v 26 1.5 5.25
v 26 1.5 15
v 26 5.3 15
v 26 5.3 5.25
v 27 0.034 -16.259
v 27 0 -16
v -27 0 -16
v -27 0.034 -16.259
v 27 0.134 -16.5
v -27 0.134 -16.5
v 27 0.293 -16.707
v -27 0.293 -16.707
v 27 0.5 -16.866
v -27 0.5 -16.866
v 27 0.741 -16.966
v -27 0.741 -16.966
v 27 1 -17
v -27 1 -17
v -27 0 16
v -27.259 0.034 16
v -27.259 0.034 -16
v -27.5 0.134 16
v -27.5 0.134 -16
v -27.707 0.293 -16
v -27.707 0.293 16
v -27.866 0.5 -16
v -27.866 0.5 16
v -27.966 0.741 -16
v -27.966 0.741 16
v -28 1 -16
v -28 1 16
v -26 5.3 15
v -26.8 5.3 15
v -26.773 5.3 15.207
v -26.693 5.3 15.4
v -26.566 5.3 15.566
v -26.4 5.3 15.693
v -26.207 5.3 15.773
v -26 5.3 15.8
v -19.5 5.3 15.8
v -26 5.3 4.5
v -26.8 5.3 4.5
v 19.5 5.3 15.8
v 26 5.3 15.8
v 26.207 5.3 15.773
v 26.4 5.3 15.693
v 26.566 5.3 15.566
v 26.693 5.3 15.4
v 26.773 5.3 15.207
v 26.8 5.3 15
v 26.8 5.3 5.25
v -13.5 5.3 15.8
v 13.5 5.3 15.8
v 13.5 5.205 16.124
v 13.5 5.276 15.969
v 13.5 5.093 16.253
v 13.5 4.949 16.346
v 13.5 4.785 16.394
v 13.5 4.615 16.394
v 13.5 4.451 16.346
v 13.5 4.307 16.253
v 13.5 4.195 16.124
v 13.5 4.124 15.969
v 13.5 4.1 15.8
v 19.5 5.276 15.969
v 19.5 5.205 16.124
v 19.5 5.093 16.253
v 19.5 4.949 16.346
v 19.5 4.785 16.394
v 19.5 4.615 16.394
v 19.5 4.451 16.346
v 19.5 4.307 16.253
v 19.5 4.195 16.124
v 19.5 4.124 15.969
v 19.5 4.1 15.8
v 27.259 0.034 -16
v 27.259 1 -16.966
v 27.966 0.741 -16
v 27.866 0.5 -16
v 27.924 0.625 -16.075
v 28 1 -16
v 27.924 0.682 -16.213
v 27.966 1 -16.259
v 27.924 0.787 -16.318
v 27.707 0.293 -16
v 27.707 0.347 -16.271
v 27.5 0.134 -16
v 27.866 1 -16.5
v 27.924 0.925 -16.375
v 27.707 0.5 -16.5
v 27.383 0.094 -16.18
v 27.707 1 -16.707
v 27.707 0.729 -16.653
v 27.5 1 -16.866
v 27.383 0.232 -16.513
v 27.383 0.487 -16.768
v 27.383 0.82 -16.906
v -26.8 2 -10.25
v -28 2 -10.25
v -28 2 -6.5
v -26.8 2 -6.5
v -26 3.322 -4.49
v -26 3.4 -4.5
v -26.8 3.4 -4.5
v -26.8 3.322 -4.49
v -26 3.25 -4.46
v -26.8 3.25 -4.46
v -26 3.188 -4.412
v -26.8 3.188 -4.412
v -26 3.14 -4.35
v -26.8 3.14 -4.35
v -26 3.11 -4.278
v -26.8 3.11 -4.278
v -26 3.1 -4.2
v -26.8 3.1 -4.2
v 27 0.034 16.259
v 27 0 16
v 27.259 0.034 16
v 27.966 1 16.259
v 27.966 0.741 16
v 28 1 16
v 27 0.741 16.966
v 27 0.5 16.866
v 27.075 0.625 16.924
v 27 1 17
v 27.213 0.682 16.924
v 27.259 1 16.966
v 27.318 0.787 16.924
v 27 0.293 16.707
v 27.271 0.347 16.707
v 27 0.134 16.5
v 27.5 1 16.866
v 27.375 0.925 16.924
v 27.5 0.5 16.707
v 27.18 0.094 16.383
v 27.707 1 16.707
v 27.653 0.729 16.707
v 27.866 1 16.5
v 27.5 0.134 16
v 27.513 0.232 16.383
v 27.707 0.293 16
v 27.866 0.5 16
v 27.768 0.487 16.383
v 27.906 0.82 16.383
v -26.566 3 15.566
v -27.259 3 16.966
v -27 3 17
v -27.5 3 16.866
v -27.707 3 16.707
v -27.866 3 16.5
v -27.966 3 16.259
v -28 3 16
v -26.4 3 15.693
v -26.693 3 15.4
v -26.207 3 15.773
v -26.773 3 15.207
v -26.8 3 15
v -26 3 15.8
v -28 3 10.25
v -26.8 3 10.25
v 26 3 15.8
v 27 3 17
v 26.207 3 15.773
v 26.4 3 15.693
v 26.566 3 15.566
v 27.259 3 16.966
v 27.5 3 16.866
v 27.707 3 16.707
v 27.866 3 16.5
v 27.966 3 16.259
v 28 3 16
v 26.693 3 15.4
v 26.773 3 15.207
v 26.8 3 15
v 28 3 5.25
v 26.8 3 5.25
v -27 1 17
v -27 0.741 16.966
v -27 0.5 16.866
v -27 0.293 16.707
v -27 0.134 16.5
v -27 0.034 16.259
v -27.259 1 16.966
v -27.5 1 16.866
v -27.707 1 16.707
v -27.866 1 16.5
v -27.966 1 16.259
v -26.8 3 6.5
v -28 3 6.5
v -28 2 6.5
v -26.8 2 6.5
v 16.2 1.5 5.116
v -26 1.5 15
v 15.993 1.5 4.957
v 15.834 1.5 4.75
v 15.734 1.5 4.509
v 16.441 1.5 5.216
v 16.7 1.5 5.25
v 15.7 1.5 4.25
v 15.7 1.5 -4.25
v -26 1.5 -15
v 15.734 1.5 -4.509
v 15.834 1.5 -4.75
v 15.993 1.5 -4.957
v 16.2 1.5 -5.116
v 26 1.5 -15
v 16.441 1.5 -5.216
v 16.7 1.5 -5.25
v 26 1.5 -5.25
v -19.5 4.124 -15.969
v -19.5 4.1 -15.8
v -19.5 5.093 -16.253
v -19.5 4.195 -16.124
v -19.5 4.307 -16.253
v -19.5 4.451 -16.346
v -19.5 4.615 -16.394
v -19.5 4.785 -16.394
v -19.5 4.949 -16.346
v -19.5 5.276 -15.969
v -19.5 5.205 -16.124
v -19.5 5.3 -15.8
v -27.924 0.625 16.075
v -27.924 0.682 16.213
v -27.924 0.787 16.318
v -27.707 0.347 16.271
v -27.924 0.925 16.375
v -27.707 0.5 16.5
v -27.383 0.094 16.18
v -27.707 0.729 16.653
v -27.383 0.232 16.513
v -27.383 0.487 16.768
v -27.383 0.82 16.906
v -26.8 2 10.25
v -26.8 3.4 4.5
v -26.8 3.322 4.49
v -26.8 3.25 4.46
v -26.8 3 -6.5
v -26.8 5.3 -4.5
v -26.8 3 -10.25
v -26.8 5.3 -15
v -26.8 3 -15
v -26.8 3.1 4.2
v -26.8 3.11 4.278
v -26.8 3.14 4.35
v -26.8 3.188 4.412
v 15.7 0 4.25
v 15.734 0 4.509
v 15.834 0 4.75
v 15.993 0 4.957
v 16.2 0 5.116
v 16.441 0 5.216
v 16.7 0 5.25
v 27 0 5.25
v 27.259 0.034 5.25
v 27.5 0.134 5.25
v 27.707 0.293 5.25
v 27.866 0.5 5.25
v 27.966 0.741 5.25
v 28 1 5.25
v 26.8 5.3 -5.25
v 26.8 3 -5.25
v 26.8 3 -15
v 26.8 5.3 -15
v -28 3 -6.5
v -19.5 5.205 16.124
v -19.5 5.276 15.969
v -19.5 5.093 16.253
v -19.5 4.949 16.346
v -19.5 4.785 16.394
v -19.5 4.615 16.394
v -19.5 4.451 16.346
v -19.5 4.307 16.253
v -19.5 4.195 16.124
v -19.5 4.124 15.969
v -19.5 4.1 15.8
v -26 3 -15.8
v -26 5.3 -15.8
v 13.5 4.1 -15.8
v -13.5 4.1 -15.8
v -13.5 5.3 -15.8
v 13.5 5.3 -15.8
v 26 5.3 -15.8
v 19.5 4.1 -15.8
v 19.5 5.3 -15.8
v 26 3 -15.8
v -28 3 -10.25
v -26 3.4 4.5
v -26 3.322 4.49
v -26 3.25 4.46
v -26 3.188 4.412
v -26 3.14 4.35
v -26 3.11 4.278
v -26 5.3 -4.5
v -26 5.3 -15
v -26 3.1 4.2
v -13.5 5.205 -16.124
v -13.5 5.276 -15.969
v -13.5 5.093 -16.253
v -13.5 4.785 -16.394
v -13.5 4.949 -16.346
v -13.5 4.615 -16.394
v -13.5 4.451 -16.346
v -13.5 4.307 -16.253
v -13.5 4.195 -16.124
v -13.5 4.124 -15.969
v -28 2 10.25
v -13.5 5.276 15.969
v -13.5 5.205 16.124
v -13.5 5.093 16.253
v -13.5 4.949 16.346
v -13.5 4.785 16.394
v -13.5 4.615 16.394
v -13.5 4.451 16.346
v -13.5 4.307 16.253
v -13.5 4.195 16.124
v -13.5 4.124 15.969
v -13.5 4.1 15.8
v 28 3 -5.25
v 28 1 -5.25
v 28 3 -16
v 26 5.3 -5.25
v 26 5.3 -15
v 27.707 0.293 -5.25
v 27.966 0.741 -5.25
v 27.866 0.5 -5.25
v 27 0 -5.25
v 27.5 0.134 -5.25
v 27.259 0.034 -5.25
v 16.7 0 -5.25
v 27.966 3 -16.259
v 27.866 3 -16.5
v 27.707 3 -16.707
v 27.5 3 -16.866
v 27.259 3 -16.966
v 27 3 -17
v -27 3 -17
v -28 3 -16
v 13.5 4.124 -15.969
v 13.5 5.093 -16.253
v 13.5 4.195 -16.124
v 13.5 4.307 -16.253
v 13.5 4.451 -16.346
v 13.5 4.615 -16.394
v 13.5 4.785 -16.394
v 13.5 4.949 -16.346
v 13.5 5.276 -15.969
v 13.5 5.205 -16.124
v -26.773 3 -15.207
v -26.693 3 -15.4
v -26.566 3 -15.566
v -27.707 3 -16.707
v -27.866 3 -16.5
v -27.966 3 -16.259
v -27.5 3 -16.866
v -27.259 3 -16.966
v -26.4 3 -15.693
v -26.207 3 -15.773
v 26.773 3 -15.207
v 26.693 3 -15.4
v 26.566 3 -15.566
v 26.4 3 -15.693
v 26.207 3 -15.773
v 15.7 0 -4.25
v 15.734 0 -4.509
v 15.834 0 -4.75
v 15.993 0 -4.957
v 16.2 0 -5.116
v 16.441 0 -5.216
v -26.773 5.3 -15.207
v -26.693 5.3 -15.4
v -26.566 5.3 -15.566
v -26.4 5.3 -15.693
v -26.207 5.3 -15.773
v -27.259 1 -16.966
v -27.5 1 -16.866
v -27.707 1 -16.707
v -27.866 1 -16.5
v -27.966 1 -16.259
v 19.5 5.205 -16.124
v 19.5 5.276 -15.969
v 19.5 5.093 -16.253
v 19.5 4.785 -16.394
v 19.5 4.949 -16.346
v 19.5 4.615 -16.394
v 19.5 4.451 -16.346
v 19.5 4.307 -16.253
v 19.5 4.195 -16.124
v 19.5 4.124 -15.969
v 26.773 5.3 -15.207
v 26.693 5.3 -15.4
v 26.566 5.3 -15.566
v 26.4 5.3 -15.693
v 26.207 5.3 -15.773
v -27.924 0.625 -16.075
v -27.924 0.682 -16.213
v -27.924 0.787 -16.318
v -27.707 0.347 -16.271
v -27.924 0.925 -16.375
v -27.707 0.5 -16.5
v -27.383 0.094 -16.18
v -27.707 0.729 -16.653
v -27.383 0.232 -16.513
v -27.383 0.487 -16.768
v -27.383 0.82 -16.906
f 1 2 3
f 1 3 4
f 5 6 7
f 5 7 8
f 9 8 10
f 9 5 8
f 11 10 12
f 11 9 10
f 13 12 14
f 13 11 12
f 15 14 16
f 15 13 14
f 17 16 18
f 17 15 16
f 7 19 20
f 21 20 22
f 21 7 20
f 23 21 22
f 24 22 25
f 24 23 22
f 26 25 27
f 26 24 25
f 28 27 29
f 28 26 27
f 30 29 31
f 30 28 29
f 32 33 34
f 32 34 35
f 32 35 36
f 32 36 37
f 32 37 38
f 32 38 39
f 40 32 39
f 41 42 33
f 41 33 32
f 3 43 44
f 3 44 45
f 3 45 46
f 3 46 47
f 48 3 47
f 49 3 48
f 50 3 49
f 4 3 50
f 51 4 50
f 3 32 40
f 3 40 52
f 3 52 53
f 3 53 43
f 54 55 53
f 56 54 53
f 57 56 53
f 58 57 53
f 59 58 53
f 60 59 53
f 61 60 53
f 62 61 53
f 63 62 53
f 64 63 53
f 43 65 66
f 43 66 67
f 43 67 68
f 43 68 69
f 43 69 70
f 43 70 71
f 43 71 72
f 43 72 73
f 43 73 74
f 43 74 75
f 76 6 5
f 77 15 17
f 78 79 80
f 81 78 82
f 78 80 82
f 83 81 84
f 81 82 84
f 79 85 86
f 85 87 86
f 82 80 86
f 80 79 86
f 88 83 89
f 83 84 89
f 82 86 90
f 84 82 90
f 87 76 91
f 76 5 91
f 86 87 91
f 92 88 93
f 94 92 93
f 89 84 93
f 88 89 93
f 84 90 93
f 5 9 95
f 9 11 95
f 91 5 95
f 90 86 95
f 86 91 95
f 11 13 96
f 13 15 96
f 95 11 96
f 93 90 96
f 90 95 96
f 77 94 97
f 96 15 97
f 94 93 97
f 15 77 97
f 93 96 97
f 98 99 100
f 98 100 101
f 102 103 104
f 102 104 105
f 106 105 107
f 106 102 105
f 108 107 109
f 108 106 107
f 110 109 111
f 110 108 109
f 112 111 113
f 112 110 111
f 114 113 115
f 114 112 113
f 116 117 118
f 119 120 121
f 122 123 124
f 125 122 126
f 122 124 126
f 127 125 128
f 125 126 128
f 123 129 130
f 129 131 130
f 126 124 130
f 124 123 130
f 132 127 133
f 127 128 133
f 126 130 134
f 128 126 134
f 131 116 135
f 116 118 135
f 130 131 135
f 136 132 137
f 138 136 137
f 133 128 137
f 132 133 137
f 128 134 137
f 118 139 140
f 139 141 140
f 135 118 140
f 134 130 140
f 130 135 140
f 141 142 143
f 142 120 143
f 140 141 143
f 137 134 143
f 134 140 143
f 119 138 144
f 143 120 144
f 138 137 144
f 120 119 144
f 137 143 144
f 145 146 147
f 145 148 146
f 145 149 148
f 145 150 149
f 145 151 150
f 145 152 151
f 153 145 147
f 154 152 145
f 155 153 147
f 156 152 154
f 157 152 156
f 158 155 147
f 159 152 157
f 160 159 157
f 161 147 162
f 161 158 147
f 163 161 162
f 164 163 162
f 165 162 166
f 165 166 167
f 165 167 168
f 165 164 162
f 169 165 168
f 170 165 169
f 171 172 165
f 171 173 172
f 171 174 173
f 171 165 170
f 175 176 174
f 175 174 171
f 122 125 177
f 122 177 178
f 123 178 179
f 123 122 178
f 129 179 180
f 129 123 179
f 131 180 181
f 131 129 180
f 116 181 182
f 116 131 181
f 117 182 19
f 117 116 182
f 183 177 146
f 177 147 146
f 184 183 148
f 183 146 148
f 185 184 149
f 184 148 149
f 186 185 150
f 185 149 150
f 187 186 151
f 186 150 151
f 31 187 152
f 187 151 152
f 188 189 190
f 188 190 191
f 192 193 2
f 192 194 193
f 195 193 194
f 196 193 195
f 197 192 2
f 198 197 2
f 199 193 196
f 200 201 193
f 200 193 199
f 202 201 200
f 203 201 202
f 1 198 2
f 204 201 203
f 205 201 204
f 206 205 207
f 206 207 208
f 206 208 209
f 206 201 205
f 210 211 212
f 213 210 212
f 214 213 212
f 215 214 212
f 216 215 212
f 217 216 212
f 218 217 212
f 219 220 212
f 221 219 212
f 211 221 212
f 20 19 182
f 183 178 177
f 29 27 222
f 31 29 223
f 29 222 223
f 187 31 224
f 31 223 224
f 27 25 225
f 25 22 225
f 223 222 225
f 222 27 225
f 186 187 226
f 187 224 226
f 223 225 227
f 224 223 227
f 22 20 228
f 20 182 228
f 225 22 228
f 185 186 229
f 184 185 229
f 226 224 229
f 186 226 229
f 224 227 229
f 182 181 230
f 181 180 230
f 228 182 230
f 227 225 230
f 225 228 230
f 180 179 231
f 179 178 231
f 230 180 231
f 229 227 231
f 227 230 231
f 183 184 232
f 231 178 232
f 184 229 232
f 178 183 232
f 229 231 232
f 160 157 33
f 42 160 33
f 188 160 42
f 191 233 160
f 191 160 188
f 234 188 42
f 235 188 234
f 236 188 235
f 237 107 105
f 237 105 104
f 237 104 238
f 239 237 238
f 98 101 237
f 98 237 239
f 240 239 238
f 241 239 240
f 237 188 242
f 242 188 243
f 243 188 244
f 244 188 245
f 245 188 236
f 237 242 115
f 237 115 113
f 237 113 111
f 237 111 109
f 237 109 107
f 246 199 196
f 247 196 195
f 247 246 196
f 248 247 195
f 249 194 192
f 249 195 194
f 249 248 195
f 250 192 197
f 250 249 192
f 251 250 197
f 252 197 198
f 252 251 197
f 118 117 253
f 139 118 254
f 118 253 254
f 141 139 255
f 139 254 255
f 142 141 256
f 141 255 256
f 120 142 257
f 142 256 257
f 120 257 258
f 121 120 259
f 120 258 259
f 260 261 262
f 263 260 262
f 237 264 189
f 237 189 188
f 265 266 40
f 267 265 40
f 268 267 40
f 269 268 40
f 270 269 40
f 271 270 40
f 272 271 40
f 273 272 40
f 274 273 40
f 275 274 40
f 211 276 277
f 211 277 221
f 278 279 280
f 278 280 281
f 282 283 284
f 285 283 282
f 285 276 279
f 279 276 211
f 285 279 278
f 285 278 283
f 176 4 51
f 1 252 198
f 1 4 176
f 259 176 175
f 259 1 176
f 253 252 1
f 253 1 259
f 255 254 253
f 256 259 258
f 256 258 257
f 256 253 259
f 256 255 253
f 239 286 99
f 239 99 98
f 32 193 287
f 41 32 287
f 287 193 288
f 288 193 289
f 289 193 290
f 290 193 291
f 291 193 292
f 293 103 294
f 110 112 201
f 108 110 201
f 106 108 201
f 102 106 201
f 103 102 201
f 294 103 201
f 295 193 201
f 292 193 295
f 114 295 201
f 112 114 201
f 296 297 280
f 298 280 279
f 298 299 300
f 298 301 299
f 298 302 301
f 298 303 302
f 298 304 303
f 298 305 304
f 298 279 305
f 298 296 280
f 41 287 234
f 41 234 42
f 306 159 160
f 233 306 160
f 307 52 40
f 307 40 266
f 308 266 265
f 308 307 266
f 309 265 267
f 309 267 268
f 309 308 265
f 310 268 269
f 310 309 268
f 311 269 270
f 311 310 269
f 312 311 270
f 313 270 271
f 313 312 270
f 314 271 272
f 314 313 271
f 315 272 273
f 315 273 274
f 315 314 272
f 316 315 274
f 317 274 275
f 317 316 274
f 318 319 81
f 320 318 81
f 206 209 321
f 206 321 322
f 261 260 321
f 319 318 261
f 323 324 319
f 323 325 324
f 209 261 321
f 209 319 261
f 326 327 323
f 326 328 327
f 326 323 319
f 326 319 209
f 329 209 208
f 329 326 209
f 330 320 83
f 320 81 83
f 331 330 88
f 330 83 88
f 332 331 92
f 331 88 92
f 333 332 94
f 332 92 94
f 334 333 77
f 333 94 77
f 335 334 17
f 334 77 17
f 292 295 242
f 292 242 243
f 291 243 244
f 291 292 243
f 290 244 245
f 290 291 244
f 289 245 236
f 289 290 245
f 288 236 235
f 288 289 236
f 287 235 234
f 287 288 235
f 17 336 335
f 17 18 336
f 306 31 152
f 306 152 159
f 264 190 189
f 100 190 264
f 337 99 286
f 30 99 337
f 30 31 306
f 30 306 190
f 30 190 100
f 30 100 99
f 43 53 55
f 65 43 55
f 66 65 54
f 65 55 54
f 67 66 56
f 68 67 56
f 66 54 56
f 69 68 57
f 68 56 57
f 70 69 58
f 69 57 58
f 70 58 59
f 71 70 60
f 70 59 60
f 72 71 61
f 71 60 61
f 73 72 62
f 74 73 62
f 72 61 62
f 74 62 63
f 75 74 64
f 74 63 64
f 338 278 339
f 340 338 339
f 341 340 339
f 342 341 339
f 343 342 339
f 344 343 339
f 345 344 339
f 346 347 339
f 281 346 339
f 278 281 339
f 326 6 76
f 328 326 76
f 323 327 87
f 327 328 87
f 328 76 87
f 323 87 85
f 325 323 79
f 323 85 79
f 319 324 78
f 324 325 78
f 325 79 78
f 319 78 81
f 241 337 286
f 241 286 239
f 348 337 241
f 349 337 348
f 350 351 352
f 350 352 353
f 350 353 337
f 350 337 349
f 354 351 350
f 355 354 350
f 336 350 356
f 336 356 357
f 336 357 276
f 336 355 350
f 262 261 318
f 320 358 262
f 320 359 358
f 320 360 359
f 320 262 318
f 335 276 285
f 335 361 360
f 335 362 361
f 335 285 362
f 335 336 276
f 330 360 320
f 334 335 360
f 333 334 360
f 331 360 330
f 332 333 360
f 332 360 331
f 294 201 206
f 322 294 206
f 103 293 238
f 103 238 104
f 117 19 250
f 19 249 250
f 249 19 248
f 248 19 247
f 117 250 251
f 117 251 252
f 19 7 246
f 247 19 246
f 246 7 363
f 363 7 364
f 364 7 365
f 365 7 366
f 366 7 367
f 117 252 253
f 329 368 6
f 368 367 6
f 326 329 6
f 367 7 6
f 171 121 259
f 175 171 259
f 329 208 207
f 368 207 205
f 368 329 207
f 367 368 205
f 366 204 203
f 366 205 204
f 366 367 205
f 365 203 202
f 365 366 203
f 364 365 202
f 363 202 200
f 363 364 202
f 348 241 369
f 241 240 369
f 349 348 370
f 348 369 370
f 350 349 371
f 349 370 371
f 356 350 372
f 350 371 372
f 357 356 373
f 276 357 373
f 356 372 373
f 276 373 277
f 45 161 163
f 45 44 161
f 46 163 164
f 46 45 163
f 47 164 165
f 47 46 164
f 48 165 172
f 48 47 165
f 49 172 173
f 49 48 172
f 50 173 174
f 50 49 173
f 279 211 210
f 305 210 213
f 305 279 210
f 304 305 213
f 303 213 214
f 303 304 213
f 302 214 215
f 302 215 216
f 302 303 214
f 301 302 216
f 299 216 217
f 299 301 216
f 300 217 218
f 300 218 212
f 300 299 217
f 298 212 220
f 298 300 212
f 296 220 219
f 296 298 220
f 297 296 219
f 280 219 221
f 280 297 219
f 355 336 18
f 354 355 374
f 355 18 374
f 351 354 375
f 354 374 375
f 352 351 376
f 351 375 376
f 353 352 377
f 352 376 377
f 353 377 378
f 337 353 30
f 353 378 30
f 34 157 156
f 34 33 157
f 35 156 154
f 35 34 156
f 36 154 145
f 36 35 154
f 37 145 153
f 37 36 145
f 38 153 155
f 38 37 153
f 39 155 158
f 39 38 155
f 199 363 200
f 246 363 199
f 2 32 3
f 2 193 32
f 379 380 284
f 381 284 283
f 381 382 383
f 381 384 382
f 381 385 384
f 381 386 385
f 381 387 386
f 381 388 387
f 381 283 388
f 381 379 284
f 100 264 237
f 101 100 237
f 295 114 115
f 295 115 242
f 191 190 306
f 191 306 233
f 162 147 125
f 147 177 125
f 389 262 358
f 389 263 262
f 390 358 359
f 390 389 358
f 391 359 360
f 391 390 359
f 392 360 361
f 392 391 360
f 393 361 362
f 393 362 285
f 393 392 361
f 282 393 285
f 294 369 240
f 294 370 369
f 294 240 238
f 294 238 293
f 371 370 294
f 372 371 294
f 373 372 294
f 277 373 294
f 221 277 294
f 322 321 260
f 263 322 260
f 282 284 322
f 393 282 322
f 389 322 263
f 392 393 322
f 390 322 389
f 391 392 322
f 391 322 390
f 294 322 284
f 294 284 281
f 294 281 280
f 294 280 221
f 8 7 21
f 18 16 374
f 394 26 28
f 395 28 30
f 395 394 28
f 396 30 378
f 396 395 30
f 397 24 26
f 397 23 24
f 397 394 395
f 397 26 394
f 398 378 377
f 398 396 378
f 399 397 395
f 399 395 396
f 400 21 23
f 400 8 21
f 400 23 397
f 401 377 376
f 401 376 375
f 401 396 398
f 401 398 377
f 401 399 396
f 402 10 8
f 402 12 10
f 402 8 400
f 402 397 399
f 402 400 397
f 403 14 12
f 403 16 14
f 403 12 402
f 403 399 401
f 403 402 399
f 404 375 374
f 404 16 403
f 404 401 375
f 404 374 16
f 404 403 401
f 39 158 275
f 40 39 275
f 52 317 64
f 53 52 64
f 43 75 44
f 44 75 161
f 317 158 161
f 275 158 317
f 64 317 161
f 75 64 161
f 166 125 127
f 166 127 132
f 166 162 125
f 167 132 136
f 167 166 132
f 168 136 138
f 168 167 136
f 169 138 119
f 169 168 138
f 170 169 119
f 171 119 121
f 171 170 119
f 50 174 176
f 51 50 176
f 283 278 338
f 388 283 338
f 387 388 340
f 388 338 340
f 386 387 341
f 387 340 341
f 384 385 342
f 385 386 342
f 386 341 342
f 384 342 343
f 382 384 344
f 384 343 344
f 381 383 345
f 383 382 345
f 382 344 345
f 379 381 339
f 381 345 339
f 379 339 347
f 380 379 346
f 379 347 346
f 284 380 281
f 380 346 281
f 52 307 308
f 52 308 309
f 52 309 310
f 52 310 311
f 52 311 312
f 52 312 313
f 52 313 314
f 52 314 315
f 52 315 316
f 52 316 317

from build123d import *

# Parameters (mm, degrees)
SKETCH1_W             = 56
SKETCH1_H             = 34
BASE_DEPTH            = 1.5
SKETCH1_3_W           = 56
SKETCH1_3_H           = 34
SKETCH1_3_W_2         = 52
SKETCH1_3_H_2         = 30
BOSS_EXTRUDE2_DEPTH   = 3
SKETCH2_W             = 53.6
SKETCH2_H             = 31.6
SKETCH2_W_2           = 52
SKETCH2_H_2           = 30
WALL_DEPTH            = 2.3
SKETCH3_W             = 1.2
SKETCH3_H             = 3.75
GROOVEFOROPEN_DEPTH   = 1
LOCKPINS_START        = 13.5
SKETCH4_R             = 0.6
LOCKPINS_DEPTH        = 6
FILLETBASE_R          = 1
FILLETINNER_R         = 0.8
CUTCABLE_DEPTH        = 34.182676203
CUTFORCONNECTOR_DEPTH = 34.182676203


with BuildPart() as part:
    # Sketch1 → Base (new body)
    with BuildSketch(Plane(origin=(0, 0, 0), x_dir=(1, 0, 0), z_dir=(0, 1, 0))):
        Rectangle(SKETCH1_W, SKETCH1_H)
    extrude(amount=BASE_DEPTH)

    # Sketch1<3> → Boss-Extrude2 (add)
    with BuildSketch(Plane(origin=(0, 0, 0), x_dir=(1, 0, 0), z_dir=(0, 1, 0))):
        Rectangle(SKETCH1_3_W, SKETCH1_3_H)
        Rectangle(SKETCH1_3_W_2, SKETCH1_3_H_2, mode=Mode.SUBTRACT)
    extrude(amount=BOSS_EXTRUDE2_DEPTH)

    # Sketch2 → Wall (add)
    with BuildSketch(Plane(origin=(0, 3, 0), x_dir=(1, 0, 0), z_dir=(0, 1, 0))):
        Rectangle(SKETCH2_W, SKETCH2_H)
        Rectangle(SKETCH2_W_2, SKETCH2_H_2, mode=Mode.SUBTRACT)
    extrude(amount=WALL_DEPTH)

    # Sketch3 → GrooveForOpen (cut)
    with BuildSketch(Plane(origin=(0, 3, 0), x_dir=(1, 0, 0), z_dir=(0, 1, 0))):
        with Locations((-27.4, -8.375)):
            Rectangle(SKETCH3_W, SKETCH3_H)
        with Locations((-27.4, 8.375)):
            Rectangle(SKETCH3_W, SKETCH3_H)
    extrude(amount=-GROOVEFOROPEN_DEPTH, mode=Mode.SUBTRACT)

    # Sketch4 → LockPins (add)
    with BuildSketch(Plane(origin=(0, 0, 0), x_dir=(0, 0, -1), z_dir=(1, 0, 0)).offset(LOCKPINS_START)):
        with Locations((15.8, 4.7)):
            Circle(SKETCH4_R)
        with Locations((-15.8, 4.7)):
            Circle(SKETCH4_R)
    lockpins = extrude(amount=LOCKPINS_DEPTH)

    # LockPins2: LockPins across plane
    add(lockpins.mirror(Plane(origin=(0, 0, 0), x_dir=(0, 0, 1), z_dir=(1, 0, 0))))

    # FilletBase
    filletbase_edges = [part.edges().sort_by_distance(p)[0] for p in [
        (0, 0, 17),
        (28, 0, 0),
        (0, 0, -17),
        (-28, 0, 0),
        (28, 1.5, 17),
        (-28, 1.5, 17),
        (-28, 1.5, -17),
        (28, 1.5, -17),
    ]]
    fillet(filletbase_edges, radius=FILLETBASE_R)

    # FilletInner
    filletinner_edges = [part.edges().sort_by_distance(p)[0] for p in [
        (26.8, 4.15, 15.8),
        (-26.8, 4.15, 15.8),
        (-26.8, 4.15, -15.8),
        (26.8, 4.15, -15.8),
    ]]
    fillet(filletinner_edges, radius=FILLETINNER_R)

    # Sketch5 → CutCable (cut, through all)
    with BuildSketch(Plane(origin=(0, 0, 0), x_dir=(0, 0, -1), z_dir=(1, 0, 0))):
        with BuildLine():
            Line((-4.5, 5.462258994), (4.5, 5.462258994))
            Line((4.5, 5.462258994), (4.5, 3.4))
            ThreePointArc((4.5, 3.4), (4.412132034, 3.187867966), (4.2, 3.1))
            Line((4.2, 3.1), (-4.2, 3.1))
            ThreePointArc((-4.2, 3.1), (-4.412132034, 3.187867966), (-4.5, 3.4))
            Line((-4.5, 3.4), (-4.5, 5.462258994))
        make_face()
    extrude(amount=-CUTCABLE_DEPTH, mode=Mode.SUBTRACT)

    # Sketch7 → CutForConnector (cut, through all)
    with BuildSketch(Plane.XZ):
        with BuildLine():
            Line((28.0151422, -5.25), (16.7, -5.25))
            ThreePointArc((16.7, -5.25), (15.992893219, -4.957106781), (15.7, -4.25))
            Line((15.7, -4.25), (15.7, 4.25))
            ThreePointArc((15.7, 4.25), (15.992893219, 4.957106781), (16.7, 5.25))
            Line((16.7, 5.25), (28.0151422, 5.25))
            Line((28.0151422, 5.25), (28.0151422, -5.25))
        make_face()
    extrude(amount=-CUTFORCONNECTOR_DEPTH, mode=Mode.SUBTRACT)


solid = part.part
